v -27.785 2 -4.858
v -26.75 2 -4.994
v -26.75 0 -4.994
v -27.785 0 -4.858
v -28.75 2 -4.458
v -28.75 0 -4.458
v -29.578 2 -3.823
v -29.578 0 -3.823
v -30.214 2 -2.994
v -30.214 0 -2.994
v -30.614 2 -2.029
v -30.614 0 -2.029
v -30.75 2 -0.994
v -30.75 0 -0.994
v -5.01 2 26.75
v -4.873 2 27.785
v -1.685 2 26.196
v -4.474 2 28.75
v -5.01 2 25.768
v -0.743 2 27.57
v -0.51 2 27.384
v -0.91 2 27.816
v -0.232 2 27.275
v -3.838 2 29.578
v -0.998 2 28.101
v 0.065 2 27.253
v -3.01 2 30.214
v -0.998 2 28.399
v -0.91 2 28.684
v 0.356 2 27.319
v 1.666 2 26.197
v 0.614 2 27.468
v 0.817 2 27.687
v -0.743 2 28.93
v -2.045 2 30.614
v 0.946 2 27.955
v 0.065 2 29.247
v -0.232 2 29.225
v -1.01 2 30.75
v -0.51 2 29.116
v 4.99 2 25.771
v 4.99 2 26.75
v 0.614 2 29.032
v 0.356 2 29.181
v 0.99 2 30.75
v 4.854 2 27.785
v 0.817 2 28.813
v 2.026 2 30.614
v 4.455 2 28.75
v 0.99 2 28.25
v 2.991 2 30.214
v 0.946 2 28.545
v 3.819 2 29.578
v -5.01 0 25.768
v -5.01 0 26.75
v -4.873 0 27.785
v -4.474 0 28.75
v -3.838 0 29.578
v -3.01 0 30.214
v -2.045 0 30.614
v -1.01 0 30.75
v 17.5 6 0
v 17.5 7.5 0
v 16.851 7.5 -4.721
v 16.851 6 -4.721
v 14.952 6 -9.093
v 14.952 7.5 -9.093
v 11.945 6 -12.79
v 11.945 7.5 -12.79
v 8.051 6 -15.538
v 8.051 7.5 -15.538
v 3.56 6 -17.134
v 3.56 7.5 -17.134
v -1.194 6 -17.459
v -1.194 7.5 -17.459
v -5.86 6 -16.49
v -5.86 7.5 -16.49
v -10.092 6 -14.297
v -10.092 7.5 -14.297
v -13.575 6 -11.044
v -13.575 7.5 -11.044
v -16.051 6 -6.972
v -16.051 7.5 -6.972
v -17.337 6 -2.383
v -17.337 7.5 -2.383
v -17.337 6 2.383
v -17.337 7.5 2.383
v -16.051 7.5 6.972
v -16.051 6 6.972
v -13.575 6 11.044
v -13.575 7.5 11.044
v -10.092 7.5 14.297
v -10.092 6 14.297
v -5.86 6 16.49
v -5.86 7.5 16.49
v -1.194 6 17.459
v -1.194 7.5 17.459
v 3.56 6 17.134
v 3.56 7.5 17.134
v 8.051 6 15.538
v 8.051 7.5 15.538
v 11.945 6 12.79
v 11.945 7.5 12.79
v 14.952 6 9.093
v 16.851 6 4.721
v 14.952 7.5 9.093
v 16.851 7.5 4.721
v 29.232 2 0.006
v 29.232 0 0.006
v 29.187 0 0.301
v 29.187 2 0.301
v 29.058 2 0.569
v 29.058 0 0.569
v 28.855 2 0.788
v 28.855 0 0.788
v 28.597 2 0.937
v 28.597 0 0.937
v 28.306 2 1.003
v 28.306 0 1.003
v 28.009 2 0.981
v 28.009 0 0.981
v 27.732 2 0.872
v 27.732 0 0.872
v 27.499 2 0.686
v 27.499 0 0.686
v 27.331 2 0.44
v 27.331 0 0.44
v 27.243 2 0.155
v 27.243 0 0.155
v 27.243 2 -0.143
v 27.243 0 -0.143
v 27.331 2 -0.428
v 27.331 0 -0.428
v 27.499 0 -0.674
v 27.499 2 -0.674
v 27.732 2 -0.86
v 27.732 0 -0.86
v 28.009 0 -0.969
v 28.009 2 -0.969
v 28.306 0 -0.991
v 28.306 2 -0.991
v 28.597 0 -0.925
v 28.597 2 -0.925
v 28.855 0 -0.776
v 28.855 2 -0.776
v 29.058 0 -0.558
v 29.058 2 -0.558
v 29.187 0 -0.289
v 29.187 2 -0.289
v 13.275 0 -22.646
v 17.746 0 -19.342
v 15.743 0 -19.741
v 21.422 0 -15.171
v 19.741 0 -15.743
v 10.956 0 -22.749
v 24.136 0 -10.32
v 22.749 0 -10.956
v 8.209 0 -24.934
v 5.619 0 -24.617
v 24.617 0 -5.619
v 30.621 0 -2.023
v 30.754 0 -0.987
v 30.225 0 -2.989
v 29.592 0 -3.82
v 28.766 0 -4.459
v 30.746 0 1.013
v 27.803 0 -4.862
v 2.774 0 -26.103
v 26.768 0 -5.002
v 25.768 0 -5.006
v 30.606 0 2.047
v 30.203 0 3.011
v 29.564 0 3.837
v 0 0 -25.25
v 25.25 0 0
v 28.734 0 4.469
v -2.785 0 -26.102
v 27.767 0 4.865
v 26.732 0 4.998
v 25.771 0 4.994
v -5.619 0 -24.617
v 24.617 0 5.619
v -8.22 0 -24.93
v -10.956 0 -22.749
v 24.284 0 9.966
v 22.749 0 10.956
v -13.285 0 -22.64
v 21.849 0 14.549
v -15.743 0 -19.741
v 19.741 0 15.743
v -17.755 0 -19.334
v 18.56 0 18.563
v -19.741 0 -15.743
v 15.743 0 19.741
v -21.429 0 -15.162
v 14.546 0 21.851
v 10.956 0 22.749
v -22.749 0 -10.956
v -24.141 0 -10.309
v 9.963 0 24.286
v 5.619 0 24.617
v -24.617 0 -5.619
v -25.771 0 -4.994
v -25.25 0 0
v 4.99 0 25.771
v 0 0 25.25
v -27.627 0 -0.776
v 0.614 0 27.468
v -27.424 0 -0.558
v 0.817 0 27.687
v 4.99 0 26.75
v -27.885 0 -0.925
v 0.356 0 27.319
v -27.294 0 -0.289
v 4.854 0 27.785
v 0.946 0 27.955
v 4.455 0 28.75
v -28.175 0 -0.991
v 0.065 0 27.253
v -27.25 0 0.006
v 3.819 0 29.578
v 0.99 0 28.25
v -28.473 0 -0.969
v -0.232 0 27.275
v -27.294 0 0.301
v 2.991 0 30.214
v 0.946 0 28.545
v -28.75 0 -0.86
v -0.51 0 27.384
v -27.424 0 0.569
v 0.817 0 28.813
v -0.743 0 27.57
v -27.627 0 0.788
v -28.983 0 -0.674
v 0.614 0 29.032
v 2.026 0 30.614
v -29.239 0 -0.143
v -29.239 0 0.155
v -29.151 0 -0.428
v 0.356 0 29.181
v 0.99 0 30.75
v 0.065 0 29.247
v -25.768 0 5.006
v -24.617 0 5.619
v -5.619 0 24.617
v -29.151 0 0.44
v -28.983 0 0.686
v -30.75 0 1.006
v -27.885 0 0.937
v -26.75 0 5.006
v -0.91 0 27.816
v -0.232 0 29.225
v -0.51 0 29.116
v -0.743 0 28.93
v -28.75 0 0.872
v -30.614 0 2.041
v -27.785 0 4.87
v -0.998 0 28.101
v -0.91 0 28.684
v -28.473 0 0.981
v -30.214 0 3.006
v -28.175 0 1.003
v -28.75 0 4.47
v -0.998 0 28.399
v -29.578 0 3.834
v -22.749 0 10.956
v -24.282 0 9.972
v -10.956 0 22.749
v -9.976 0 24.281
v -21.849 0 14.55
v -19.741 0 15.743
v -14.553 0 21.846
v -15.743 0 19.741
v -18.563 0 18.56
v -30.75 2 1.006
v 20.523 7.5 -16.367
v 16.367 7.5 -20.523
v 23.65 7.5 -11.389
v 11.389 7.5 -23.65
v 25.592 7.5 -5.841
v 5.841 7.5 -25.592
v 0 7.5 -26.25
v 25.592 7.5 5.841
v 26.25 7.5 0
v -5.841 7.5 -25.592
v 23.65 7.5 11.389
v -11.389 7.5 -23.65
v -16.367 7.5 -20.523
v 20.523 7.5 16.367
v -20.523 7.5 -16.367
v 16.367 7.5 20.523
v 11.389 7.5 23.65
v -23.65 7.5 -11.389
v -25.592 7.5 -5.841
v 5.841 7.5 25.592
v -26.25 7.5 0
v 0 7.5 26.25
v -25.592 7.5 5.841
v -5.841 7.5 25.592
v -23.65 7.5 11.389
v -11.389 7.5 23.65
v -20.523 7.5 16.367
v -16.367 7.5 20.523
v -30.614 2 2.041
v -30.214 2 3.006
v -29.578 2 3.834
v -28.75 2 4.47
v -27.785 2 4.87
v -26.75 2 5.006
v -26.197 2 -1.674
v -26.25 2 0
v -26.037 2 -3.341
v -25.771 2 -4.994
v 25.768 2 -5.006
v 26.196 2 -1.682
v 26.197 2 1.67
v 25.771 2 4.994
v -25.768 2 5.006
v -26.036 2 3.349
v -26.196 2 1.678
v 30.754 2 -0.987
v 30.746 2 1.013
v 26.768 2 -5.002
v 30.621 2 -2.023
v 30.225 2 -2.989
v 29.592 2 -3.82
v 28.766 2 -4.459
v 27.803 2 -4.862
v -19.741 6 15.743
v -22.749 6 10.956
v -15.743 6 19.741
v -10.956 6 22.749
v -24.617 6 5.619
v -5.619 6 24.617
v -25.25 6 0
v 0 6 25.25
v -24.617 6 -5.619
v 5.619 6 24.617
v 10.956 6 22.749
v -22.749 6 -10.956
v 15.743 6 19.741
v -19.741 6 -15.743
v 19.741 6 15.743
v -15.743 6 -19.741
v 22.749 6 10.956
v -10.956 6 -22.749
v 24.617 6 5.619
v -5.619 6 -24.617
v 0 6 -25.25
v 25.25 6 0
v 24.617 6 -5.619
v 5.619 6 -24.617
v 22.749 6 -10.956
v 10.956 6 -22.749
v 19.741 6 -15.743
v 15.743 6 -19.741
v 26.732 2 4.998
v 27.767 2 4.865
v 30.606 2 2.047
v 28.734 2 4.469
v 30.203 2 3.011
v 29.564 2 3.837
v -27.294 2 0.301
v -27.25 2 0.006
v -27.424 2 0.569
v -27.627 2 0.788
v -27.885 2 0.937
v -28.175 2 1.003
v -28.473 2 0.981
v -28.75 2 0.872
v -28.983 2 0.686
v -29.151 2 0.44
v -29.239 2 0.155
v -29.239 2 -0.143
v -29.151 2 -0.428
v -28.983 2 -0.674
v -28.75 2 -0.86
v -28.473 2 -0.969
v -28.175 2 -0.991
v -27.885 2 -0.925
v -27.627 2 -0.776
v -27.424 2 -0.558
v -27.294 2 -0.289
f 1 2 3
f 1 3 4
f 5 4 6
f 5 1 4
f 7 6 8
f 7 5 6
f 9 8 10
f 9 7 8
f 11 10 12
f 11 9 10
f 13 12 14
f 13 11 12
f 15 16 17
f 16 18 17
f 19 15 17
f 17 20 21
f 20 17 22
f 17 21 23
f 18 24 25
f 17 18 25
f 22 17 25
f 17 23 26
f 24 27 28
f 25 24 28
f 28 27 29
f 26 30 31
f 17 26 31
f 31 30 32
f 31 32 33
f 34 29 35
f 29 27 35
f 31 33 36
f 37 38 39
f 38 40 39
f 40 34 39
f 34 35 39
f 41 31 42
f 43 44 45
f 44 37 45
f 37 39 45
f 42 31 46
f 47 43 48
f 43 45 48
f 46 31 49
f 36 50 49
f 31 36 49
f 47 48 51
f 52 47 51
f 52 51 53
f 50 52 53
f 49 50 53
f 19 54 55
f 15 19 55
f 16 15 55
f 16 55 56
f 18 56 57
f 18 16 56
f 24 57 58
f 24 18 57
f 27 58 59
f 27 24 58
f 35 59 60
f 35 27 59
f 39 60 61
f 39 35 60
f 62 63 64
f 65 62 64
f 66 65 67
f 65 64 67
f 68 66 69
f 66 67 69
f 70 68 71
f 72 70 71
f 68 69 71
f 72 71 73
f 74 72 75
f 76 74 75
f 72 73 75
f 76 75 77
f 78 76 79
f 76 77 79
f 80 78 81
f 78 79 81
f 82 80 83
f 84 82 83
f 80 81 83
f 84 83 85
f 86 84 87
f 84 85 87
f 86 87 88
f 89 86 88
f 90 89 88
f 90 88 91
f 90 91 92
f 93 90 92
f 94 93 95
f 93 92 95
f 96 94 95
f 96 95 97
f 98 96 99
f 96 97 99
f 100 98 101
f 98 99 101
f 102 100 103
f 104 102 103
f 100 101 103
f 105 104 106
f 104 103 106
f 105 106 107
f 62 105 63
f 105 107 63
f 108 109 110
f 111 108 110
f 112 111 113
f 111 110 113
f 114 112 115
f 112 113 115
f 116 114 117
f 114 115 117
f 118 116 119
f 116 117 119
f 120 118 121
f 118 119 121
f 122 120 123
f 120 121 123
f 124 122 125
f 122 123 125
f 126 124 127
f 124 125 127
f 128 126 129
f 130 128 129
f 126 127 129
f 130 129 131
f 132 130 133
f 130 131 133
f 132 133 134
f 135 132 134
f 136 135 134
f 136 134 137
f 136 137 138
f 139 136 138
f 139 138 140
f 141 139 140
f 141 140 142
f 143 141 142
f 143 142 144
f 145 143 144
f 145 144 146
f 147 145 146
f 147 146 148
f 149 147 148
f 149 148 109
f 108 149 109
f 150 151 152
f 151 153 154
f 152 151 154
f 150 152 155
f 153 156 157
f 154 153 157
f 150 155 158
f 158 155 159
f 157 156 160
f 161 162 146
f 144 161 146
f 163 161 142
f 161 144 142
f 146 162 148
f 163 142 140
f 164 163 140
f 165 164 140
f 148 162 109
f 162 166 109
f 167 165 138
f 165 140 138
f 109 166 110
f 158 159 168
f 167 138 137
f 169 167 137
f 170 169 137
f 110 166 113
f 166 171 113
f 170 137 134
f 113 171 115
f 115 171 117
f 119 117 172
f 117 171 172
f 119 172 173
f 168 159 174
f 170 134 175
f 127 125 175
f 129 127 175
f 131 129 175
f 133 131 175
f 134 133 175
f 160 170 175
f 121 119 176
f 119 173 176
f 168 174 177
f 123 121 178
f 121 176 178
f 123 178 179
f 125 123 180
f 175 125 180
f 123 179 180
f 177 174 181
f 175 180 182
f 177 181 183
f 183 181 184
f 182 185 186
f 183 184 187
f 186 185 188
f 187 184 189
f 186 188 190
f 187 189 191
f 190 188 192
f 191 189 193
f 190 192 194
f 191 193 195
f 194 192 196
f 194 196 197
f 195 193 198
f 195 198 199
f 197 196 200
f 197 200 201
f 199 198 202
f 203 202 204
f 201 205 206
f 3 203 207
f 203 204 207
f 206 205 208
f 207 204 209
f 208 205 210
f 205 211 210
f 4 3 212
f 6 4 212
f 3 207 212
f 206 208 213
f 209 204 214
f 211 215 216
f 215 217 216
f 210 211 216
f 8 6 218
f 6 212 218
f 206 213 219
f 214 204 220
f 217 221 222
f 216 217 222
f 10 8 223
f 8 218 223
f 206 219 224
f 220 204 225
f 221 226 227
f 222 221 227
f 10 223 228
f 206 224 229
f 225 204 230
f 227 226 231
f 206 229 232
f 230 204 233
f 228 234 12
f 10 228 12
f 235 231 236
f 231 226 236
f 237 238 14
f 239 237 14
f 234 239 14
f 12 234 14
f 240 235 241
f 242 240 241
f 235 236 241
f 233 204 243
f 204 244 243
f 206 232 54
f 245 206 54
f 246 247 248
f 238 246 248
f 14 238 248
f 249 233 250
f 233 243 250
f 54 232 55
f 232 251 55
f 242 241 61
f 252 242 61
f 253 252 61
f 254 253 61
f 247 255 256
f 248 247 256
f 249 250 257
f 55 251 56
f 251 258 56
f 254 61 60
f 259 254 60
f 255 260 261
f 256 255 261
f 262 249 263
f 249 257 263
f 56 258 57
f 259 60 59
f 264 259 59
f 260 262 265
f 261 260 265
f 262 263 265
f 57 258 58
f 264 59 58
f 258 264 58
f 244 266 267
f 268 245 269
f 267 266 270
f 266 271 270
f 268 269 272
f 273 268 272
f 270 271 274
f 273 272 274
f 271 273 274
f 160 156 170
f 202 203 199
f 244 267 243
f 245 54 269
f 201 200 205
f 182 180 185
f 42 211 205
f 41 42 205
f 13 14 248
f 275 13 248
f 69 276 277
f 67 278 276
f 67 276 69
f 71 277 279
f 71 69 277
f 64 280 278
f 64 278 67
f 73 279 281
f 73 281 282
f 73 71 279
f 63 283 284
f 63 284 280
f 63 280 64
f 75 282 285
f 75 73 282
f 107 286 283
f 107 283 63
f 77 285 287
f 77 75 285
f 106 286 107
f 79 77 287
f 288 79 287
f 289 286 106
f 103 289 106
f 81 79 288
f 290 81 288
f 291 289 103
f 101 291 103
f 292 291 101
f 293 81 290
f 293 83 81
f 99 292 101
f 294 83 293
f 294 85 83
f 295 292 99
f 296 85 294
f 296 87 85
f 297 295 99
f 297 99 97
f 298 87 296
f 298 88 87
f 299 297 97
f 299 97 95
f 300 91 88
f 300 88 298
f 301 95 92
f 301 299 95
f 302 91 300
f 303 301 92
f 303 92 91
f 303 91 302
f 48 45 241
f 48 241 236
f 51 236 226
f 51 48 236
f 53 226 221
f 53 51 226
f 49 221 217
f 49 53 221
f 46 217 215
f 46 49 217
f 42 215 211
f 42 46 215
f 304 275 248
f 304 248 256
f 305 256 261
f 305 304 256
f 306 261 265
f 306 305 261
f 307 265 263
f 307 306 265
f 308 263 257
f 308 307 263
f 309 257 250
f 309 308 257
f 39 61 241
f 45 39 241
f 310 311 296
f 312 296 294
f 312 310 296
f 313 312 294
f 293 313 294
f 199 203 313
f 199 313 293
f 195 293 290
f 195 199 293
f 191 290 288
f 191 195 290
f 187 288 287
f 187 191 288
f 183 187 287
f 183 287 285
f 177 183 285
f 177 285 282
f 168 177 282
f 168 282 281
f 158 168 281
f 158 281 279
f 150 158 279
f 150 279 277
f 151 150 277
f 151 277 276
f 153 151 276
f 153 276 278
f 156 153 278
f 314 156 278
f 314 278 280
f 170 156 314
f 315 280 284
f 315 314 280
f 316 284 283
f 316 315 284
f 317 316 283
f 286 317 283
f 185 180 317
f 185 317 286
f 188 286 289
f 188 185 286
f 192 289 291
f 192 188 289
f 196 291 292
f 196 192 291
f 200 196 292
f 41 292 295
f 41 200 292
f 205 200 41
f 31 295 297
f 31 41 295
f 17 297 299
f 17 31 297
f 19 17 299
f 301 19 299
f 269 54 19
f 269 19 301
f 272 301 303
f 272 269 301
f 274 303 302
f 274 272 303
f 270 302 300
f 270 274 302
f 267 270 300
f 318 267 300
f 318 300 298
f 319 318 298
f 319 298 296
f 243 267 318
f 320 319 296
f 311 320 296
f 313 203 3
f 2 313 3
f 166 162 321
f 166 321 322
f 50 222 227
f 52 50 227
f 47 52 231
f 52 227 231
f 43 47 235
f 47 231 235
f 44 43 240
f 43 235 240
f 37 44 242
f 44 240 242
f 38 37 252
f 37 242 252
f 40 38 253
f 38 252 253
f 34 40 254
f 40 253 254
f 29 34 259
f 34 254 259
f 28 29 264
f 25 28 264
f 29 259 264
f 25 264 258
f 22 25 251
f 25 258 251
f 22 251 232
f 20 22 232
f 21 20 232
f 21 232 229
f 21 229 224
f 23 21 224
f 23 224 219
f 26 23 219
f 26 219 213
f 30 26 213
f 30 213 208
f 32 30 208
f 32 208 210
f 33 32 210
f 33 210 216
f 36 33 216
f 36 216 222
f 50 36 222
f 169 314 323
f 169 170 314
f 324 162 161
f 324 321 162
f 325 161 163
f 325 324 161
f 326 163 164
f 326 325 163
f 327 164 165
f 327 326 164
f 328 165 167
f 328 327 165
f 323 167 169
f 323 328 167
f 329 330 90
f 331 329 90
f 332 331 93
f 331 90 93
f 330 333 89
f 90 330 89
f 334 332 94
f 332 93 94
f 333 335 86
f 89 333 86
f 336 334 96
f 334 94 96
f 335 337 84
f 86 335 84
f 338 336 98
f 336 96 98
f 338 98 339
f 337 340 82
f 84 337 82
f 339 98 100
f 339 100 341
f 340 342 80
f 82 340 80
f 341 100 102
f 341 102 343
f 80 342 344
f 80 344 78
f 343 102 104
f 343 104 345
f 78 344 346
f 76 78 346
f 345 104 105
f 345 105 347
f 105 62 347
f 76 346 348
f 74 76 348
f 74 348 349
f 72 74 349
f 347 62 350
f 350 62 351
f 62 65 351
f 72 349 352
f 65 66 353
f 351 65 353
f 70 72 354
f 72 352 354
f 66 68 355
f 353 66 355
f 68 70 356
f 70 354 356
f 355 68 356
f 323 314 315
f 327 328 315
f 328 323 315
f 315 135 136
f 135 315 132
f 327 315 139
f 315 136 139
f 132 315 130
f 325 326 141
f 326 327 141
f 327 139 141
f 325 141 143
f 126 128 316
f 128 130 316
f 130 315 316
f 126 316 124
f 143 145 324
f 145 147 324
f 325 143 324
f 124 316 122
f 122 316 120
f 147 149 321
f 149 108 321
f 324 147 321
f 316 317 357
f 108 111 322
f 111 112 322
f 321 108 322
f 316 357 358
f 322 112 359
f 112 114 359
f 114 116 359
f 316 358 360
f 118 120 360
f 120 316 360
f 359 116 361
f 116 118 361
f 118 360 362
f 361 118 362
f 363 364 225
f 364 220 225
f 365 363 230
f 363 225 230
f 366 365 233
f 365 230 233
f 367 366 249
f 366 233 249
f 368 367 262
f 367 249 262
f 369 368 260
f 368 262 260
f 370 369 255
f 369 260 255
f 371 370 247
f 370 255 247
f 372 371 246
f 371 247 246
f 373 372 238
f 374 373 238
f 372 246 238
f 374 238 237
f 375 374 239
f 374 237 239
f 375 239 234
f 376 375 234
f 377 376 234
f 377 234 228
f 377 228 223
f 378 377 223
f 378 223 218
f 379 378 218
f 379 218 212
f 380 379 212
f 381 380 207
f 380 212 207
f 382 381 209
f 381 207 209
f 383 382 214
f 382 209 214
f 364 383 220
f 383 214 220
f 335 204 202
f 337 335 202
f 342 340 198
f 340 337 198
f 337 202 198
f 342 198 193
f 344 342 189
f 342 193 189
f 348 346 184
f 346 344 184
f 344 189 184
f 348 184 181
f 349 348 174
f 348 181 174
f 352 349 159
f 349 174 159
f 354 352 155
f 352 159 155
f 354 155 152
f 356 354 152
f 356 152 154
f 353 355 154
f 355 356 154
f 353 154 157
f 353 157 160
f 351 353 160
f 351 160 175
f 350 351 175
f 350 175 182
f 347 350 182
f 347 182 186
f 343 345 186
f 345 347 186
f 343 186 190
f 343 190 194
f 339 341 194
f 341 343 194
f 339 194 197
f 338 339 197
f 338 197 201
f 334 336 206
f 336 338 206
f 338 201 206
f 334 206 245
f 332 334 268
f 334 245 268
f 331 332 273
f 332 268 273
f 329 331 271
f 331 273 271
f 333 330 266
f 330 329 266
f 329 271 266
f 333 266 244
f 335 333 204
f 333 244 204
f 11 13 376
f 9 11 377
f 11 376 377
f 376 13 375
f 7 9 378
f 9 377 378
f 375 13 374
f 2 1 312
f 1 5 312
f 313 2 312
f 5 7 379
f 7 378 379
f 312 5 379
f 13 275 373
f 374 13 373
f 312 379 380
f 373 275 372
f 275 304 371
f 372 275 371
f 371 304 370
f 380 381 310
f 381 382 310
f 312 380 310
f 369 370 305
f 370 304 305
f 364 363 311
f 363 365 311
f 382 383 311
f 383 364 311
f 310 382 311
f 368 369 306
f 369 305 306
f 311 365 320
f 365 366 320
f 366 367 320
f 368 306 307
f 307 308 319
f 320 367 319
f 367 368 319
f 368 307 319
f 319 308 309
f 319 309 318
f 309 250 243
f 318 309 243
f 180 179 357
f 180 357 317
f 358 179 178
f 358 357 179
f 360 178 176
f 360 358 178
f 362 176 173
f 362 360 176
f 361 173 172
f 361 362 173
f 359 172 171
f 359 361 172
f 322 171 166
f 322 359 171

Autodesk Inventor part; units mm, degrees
ref_plane "YZ Plane" through (0, 0, 0) normal (1, 0, 0) x (0, 1, 0)
ref_plane "XZ Plane" through (0, 0, 0) normal (0, 1, 0) x (-1, 0, 0)
ref_plane "XY Plane" through (0, 0, 0) normal (0, 0, 1) x (1, 0, 0)
sketch "Sketch1" plane through (0, 0, 0) normal (0, 1, 0) x (-1, 0, 0)
  circle A0 centre (0, 0) radius 25.25
  circle A1 centre (0, 0) radius 26.25
  dimension "d0" = 50.5
  dimension "d1" = 52.5
extrude "Extrusion1" add sketch "Sketch1" along normal blind 7.5
sketch "Sketch2" plane through (0, 7.5, 0) normal (0, 1, 0) x (1, 0, 0)
  circle A0 centre (0, 0) radius 25.25 projected
  circle A1 centre (0, 0) radius 25.25 projected
  circle A2 centre (0, 0) radius 26.25 projected
  circle A3 centre (0, 0) radius 17.5
  dimension "d4" = 35
extrude "Extrusion2" add sketch "Sketch2" against normal blind 1.5 contours A0
sketch "Sketch3" plane through (0, 0, 0) normal (0, -1, 0) x (1, 0, 0)
  circle A0 centre (0, 0) radius 26.25 projected
  circle A1 centre (0, 0) radius 26.25 projected
  line L0 (26.25, -0.0057) -> (25.75, -0.0057)
  line L1 (-26.25, 0.0058) -> (-25.75, 0.0058)
  line L2 (-0.0095, 26.25) -> (-0.0095, 25.75)
  line L3 (25.75, -0.0057) -> (25.7683, -5.0057)
  line L4 (25.7683, -5.0057) -> (30.7683, -4.9874)
  line L5 (30.7683, -4.9874) -> (30.7317, 5.0125)
  line L6 (30.7317, 5.0125) -> (25.7317, 4.9942)
  line L7 (25.7317, 4.9942) -> (25.7317, 4.9942)
  line L8 (25.75, -0.0057) -> (25.7317, 4.9942)
  line L9 (-0.0095, 25.75) -> (-5.0095, 25.75)
  line L10 (-0.0095, 25.75) -> (4.9905, 25.75) construction
  line L11 (-5.0095, 25.75) -> (-5.0095, 30.75)
  line L12 (-5.0095, 30.75) -> (4.9905, 30.75)
  line L13 (4.9905, 30.75) -> (4.9905, 25.75)
  line L14 (4.9905, 25.75) -> (-0.0095, 25.75)
  line L15 (-25.75, 0.0058) -> (-25.75, -4.9942)
  line L16 (-25.75, 0.0058) -> (-20.75, 0.0058) construction
  line L17 (-25.75, -4.9942) -> (-30.75, -4.9942)
  line L18 (-30.75, -4.9942) -> (-30.75, 5.0058)
  line L19 (-30.75, 5.0058) -> (-25.75, 5.0058)
  line L20 (-25.75, 5.0058) -> (-25.75, 0.0058)
  circle A2 centre (28.2317, 0.0058) radius 1
  circle A3 centre (-28.25, 0.0058) radius 1
  circle A4 centre (-0.0095, 28.25) radius 1
  dimension "d7" = 0.5
  dimension "d8" = 0.5
  dimension "d9" = 0.5
  dimension "d10" = 5
  dimension "d11" = 5
  dimension "d12" = 10
  dimension "d13" = 5
  dimension "d14" = 180
  dimension "d15" = 5
  dimension "d16" = 10
  dimension "d17" = 5
  dimension "d18" = 90
  dimension "d19" = 5
  dimension "d20" = 90
  dimension "d21" = 5
  dimension "d22" = 10
  dimension "d23" = 90
  dimension "d24" = 2
  dimension "d25" = 2
  dimension "d26" = 2
extrude "Extrusion3" add sketch "Sketch3" against normal blind 2 contours A0 L6 L5 L4 | L0 L8 L6 A0 | L17 L18 L19 A0 | A0 L1 L15 L17 | A0 L19 L20 L1 | L13 L14 L2 A0 | A0 L11 L12 L13 | A0 L2 L9 L11
fillet "Fillet1" radius 4 6 edges at (-30.75, 1, -4.9942) (-30.75, 1, 5.0058) (-5.0095, 1, 30.75) (4.9905, 1, 30.75) (30.7317, 1, 5.0125) (30.7683, 1, -4.9874)
properties part number "AudioColor"
